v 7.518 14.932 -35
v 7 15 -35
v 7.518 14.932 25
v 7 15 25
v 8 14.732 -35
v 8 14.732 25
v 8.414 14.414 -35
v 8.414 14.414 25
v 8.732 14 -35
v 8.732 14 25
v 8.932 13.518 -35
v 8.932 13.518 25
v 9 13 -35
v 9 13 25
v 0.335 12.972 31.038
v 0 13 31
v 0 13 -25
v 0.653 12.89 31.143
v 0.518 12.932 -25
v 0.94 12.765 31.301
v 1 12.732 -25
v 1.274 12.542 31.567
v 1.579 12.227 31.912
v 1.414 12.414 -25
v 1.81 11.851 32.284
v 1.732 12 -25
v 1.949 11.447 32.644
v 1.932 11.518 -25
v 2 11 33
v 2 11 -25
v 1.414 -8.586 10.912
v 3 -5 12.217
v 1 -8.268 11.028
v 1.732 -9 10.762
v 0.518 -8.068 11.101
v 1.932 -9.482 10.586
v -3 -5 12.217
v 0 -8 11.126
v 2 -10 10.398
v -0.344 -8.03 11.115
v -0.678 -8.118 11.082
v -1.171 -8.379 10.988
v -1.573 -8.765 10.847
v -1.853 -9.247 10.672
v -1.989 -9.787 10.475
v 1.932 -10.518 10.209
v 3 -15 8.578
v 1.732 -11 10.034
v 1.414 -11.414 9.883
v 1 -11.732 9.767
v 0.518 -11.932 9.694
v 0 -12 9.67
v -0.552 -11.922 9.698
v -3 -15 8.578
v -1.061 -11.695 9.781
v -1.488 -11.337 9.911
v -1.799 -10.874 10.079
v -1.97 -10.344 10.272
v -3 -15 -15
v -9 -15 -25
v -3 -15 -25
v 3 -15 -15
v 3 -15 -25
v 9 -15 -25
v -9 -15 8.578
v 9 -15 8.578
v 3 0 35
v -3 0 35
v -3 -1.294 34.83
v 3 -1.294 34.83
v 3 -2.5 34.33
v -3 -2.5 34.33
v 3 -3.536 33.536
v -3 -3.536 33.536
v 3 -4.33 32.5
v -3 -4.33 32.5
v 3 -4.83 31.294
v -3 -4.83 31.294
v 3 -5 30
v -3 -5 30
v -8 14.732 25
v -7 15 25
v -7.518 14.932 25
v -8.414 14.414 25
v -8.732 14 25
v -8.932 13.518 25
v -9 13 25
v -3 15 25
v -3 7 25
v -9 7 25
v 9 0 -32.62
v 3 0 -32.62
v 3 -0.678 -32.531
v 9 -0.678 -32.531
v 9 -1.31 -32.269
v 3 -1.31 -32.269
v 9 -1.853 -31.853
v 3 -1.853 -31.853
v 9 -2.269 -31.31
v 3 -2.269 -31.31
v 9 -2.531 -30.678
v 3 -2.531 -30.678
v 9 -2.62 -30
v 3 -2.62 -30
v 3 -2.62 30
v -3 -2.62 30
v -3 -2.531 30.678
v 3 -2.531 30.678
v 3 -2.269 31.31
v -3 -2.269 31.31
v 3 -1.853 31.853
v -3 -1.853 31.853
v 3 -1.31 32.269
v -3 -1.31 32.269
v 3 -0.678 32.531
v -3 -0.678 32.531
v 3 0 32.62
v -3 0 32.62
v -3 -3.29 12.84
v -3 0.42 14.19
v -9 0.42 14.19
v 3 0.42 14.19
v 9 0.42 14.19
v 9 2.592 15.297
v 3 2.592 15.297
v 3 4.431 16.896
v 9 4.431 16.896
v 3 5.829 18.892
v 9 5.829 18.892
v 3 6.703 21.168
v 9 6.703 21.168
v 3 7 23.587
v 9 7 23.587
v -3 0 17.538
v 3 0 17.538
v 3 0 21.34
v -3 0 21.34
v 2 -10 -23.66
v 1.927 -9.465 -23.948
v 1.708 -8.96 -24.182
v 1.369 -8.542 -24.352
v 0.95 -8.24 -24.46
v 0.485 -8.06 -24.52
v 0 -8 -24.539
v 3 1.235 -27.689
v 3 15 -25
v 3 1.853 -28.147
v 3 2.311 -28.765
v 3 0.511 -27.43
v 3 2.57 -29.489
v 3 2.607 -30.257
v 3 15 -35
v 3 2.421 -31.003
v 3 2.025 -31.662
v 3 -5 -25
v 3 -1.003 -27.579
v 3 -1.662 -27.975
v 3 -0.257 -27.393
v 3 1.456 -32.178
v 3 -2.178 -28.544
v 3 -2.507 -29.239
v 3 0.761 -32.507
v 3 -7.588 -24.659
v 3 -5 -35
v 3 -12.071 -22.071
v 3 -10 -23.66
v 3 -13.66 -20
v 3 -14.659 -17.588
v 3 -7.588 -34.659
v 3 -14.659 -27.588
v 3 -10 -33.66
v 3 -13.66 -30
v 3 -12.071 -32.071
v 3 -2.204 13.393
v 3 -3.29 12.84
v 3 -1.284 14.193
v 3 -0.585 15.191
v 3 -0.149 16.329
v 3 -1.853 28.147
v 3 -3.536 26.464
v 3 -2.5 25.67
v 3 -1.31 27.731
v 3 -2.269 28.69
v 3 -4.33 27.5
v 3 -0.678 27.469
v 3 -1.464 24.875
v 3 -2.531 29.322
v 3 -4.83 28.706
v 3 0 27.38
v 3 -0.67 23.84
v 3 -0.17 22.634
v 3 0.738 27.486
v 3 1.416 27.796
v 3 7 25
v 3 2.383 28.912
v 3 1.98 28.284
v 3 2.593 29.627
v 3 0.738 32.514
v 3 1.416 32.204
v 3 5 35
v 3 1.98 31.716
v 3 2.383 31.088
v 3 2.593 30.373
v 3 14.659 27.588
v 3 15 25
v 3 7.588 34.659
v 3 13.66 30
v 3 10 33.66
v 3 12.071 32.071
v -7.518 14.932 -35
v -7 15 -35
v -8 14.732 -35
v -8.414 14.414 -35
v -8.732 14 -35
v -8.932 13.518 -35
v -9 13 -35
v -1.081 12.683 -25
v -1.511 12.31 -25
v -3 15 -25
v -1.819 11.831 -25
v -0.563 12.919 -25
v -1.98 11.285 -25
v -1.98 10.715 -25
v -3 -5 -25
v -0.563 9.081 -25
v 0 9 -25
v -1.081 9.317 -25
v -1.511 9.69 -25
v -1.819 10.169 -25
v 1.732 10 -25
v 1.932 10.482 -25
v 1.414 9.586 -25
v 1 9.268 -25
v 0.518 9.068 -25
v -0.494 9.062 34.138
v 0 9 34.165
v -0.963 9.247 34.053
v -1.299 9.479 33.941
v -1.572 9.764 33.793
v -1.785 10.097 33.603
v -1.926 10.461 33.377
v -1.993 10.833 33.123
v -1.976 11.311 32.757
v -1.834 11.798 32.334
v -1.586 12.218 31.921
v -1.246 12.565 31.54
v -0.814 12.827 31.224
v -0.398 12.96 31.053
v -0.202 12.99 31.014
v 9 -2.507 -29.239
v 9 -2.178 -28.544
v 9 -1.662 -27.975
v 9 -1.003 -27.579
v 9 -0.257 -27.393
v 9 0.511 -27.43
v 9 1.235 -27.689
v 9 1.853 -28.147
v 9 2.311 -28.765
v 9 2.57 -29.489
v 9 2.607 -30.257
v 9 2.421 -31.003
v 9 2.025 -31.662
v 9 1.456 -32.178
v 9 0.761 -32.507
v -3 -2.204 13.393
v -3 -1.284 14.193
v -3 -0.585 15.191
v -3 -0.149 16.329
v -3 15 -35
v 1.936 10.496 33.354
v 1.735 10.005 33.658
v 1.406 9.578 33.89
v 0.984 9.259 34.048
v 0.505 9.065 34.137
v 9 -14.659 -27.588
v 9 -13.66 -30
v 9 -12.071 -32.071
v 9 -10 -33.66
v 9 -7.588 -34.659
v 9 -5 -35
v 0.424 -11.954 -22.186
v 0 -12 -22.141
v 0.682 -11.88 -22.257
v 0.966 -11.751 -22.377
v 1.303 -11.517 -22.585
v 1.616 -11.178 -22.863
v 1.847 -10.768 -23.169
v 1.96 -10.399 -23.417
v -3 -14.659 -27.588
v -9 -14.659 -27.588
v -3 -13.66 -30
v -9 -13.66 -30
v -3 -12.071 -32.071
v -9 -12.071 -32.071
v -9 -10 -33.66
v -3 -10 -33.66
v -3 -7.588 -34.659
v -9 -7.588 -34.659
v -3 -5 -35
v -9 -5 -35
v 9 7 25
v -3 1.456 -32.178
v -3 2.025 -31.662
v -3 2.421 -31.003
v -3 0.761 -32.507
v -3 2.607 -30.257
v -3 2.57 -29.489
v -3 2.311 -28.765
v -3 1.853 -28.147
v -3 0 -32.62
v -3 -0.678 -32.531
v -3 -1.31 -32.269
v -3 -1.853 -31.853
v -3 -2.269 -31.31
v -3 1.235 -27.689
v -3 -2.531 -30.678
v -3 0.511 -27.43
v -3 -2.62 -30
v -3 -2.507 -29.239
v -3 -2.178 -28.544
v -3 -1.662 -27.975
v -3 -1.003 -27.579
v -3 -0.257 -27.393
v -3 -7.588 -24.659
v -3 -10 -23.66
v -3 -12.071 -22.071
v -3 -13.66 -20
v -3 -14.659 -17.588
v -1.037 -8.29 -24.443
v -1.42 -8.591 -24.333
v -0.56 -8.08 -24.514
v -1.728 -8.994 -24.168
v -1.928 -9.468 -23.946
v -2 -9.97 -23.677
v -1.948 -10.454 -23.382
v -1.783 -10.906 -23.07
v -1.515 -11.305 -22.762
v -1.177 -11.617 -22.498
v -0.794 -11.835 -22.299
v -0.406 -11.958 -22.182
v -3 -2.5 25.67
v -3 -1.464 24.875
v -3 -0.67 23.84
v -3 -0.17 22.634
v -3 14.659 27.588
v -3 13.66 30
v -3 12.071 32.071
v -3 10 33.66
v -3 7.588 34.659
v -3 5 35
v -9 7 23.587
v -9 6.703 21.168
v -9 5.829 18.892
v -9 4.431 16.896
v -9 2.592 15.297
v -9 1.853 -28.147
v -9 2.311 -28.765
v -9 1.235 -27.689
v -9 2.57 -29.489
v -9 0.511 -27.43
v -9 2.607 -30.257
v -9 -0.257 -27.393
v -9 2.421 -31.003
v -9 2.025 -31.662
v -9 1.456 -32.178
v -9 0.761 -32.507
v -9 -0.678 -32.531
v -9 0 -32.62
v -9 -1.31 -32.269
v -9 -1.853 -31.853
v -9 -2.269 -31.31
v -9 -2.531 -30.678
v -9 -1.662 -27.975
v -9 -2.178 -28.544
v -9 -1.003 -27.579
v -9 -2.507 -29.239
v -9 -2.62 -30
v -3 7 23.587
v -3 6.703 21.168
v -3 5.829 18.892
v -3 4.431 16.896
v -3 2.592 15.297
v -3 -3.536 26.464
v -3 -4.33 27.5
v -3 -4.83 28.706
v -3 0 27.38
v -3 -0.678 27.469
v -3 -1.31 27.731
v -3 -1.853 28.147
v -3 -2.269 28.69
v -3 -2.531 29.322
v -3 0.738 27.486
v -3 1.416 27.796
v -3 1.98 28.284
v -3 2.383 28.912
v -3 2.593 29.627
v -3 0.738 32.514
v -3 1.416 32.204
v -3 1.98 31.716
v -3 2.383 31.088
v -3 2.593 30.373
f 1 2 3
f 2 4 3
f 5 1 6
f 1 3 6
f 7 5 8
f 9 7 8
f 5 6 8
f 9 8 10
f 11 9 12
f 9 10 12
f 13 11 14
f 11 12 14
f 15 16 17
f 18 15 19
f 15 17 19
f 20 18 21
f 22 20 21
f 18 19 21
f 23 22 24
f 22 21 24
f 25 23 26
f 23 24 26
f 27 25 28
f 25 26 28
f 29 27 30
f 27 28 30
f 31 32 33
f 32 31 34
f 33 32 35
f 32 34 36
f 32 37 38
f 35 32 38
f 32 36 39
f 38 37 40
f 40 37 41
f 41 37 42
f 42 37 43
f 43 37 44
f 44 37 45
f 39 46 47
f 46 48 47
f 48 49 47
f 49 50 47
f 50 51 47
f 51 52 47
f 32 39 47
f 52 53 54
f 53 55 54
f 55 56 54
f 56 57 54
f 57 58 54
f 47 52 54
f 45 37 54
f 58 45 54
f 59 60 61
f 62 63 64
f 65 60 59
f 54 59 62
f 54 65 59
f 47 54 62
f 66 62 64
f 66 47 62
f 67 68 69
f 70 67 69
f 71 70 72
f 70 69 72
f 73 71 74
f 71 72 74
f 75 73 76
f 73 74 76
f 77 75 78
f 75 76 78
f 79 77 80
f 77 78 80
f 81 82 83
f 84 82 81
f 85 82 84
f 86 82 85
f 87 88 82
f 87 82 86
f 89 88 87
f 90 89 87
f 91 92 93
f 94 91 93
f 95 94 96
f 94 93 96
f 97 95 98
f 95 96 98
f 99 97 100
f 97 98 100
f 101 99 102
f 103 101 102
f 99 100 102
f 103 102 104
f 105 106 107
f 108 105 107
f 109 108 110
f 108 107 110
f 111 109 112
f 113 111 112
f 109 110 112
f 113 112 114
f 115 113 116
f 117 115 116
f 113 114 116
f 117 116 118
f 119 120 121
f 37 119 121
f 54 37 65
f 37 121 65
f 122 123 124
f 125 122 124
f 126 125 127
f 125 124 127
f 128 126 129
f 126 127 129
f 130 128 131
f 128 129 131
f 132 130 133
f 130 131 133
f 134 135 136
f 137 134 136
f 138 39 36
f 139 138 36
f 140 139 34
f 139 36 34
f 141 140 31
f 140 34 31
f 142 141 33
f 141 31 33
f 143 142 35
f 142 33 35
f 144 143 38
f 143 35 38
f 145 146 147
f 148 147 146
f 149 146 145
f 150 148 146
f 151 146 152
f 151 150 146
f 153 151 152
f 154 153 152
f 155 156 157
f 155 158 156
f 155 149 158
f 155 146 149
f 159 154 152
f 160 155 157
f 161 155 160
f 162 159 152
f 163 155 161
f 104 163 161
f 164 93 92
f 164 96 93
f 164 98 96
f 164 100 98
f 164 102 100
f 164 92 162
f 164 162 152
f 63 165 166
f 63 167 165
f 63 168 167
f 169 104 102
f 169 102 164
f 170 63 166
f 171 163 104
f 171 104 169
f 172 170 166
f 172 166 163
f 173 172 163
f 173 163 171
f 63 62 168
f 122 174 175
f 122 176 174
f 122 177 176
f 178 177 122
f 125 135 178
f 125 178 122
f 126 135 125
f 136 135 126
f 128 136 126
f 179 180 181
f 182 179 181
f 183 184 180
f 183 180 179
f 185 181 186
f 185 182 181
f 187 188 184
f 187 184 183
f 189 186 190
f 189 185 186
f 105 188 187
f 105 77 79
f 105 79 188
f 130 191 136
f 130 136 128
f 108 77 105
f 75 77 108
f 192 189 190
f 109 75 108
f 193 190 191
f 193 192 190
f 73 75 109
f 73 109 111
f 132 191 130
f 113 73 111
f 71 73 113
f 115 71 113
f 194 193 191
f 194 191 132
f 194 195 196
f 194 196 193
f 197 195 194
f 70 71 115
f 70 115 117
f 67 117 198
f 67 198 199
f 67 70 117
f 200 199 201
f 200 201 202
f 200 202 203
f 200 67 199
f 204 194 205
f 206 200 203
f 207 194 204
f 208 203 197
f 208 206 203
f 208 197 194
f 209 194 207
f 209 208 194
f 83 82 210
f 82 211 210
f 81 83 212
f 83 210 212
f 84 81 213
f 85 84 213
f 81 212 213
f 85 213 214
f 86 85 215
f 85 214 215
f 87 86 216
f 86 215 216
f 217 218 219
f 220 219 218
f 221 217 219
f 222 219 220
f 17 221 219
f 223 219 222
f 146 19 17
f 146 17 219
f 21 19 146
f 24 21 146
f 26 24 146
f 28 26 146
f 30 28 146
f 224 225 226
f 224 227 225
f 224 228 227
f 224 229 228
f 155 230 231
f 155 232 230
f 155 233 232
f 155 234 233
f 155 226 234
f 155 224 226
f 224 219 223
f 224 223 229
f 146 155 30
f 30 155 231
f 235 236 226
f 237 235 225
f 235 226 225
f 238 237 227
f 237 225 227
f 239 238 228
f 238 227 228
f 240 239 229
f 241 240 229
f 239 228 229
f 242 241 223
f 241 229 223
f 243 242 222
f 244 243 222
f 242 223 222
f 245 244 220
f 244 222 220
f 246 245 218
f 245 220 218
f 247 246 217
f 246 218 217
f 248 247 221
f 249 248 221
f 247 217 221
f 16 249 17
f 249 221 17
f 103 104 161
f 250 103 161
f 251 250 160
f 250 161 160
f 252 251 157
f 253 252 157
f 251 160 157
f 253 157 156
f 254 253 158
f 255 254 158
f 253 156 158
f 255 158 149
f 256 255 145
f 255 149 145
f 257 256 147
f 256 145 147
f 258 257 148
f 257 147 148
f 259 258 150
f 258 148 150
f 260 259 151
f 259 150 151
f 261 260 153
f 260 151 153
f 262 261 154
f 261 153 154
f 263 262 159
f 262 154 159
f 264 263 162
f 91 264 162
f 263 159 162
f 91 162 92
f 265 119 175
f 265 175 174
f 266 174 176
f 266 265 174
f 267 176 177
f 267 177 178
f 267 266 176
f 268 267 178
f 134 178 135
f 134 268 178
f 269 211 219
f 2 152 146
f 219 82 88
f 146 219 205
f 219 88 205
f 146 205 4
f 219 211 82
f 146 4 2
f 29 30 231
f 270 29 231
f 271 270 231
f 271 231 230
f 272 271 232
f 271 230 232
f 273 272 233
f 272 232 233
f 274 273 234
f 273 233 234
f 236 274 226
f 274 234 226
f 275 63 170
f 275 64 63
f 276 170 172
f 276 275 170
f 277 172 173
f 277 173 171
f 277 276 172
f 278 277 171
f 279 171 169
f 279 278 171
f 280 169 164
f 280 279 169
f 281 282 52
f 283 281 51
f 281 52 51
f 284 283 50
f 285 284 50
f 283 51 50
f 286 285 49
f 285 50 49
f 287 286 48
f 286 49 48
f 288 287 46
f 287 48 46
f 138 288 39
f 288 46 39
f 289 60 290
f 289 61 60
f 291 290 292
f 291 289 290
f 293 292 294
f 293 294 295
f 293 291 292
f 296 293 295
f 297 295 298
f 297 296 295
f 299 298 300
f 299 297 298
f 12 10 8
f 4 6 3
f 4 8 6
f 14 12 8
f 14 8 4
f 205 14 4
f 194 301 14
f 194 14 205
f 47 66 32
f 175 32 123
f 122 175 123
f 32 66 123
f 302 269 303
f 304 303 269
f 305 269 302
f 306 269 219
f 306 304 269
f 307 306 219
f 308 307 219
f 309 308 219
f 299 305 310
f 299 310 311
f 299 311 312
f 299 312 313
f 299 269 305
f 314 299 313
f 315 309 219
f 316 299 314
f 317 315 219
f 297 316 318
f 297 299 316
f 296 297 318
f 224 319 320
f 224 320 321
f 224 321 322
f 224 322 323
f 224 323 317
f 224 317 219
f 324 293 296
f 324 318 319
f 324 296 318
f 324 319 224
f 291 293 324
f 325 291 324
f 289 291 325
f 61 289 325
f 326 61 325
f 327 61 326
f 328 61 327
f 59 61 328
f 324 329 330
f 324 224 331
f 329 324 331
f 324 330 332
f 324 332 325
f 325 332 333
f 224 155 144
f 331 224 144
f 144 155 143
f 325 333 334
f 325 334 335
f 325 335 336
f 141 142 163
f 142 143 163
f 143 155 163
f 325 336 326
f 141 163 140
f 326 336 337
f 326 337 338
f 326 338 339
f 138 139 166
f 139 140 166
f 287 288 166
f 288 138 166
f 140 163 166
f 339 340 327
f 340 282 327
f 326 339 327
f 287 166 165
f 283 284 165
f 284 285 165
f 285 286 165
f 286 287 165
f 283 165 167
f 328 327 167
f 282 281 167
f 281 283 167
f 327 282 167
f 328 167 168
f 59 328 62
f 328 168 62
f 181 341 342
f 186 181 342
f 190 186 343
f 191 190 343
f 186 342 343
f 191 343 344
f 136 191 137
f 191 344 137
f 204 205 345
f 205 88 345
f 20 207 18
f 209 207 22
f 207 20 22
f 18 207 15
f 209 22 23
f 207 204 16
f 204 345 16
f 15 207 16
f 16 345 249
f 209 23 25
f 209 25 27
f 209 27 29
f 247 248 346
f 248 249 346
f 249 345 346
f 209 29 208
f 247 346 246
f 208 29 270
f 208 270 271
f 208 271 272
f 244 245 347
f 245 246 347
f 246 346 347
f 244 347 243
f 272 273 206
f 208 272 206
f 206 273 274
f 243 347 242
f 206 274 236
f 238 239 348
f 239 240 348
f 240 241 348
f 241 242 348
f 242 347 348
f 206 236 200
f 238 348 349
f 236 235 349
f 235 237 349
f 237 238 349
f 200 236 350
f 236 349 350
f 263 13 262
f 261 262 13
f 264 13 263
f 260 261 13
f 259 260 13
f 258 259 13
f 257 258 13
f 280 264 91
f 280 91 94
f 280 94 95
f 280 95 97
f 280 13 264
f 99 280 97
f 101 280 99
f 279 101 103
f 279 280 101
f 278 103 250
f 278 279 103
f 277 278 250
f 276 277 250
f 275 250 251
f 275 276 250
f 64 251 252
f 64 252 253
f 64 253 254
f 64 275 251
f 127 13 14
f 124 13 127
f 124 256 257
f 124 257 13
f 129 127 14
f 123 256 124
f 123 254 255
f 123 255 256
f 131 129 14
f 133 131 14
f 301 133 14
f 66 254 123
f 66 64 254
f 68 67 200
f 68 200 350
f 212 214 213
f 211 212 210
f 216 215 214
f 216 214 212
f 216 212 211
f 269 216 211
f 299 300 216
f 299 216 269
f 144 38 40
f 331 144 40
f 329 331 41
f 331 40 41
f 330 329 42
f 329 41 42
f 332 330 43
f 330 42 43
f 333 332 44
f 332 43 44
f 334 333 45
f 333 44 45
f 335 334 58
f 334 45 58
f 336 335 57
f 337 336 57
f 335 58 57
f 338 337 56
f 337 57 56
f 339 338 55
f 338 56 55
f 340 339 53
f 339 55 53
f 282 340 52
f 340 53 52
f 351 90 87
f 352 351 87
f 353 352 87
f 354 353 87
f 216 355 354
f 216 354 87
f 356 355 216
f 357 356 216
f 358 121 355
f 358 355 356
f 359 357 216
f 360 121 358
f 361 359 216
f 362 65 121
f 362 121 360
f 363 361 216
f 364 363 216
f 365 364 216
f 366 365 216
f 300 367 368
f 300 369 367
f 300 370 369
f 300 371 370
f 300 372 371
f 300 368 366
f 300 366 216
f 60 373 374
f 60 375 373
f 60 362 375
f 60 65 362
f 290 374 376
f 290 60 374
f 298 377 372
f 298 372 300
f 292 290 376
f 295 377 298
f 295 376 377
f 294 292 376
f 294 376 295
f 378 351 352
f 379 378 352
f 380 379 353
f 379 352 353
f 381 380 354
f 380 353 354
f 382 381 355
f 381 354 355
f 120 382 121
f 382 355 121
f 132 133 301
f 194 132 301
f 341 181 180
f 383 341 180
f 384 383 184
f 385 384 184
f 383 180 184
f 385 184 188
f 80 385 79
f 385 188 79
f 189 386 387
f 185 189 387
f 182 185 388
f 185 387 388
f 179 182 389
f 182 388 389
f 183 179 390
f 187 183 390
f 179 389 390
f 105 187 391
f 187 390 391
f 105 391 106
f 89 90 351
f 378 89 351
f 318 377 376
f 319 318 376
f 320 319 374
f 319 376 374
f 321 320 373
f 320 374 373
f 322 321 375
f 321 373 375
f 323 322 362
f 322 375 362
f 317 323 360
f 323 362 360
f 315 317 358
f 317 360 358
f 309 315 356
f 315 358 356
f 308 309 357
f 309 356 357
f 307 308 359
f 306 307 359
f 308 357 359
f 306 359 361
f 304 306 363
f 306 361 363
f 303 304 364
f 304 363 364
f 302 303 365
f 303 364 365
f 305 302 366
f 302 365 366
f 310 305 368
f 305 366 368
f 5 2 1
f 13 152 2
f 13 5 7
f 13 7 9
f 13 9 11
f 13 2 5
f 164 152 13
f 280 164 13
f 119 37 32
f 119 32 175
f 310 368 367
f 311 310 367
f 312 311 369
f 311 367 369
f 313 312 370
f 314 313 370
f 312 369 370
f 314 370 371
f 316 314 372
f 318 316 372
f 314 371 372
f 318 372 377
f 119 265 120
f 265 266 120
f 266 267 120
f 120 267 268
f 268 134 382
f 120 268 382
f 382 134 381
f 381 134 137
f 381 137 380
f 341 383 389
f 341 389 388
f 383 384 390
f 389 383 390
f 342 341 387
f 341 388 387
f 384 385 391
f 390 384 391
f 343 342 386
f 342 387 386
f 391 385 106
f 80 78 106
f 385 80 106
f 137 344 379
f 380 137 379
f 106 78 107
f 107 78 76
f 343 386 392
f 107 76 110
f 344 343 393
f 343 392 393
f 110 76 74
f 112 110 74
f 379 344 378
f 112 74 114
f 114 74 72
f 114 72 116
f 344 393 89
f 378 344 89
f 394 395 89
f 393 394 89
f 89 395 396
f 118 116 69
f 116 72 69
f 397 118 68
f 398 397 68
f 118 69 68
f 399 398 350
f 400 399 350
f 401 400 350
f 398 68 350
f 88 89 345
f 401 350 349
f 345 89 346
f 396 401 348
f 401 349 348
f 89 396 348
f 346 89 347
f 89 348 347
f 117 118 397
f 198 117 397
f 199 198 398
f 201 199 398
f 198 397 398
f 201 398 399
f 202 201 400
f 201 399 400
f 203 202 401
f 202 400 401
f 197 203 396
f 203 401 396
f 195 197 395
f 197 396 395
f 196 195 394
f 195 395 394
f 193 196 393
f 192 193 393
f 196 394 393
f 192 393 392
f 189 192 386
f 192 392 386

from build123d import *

# Parameters (mm, degrees)
F1_DEPTH     = 15
F3_DEPTH     = 6
F5_DEPTH     = 18
F6_R         = 10
F9_DEPTH     = 6
F10_DEPTH    = 6
F11_R        = 2
F13_DEPTH    = 6
F15_R        = 10
F19_DEPTH    = 65.001
F21_DEPTH    = 60.001
F23_DEPTH    = 6
F24_T1_DEPTH = 6


# Not quite as in the source:
# - a fillet or chamfer that OpenCascade refuses, or shapes differently, is made with other operations: its cross-section is extruded or revolved along the edge and cut away or added


with BuildPart() as f1:
    # F0 (on Front) → F1 (new body, symmetric)
    with BuildSketch(Plane.XZ):
        Polygon((9, -25), (9, 25), (3, 25), (3, 35), (-3, 35), (-3, 25), (-9, 25), (-9, -25), (-9, -35), (-3, -35), (-3, -25), (3, -25), (3, -35), (9, -35), align=None)
    extrude(amount=F1_DEPTH, both=True)

    # F2 (on face) → F3 (cut)
    with BuildSketch(Plane(origin=(-3, 0, 0), x_dir=(0, -1, 0), z_dir=(-1, 0, 0))):
        with BuildLine():
            ThreePointArc((0, 32.62), (-2.62, 30), (0, 27.38))
            Line((0, 27.38), (0, 32.62))
        make_face()
        with BuildLine():
            Line((0, 32.62), (0, 27.38))
            ThreePointArc((0, 27.38), (1.8526197667, 28.1473802333), (2.62, 30))
            ThreePointArc((2.62, 30), (1.8526197667, 31.8526197667), (0, 32.62))
        make_face()
    extrude(amount=-F3_DEPTH, mode=Mode.SUBTRACT)

    # F4 (on face) → F5 (cut)
    with BuildSketch(Plane(origin=(-9, 0, 0), x_dir=(0, -1, 0), z_dir=(-1, 0, 0))):
        with BuildLine():
            ThreePointArc((0, -32.62), (1.8526197667, -31.8526197667), (2.62, -30))
            ThreePointArc((2.62, -30), (-1.8526197667, -28.1473802333), (0, -32.62))
        make_face()
    extrude(amount=-F5_DEPTH, mode=Mode.SUBTRACT)

    # F6
    f6_edges = [f1.edges().sort_by_distance(p)[0] for p in [
        (0, 15, 35),
        (0, -15, 35),
        (6, -15, -35),
        (-6, -15, -35),
    ]]
    fillet(f6_edges, radius=F6_R)

    # F8 (on face) → F9 (cut)
    with BuildSketch(Plane(origin=(-9, 0, 0), x_dir=(0, -1, 0), z_dir=(-1, 0, 0))):
        with BuildLine():
            ThreePointArc((-7, 23.5872004348), (-5.1915204429, 17.8514360713), (-0.4202014333, 14.190274227))
            Line((-0.4202014333, 14.190274227), (15, 8.5777798989))
            Line((15, 8.5777798989), (15, 25))
            Line((15, 25), (-7, 25))
            Line((-7, 25), (-7, 23.5872004348))
        make_face()
    extrude(amount=-F9_DEPTH, mode=Mode.SUBTRACT)

    # F7 (on face) → F10 (cut)
    with BuildSketch(Plane.YZ.offset(9)):
        with BuildLine():
            Line((7, 25), (-15, 25))
            Line((-15, 25), (-15, 8.57778))
            Line((-15, 8.57778), (0.4202014333, 14.1902743281))
            ThreePointArc((0.4202014333, 14.1902743281), (5.1915204429, 17.8514361724), (7, 23.587200536))
            Line((7, 23.587200536), (7, 25))
        make_face()
    extrude(amount=-F10_DEPTH, mode=Mode.SUBTRACT)

    # F11
    f11_edges = [f1.edges().sort_by_distance(p)[0] for p in [
        (9, 15, -5),
        (-9, 15, -5),
    ]]
    fillet(f11_edges, radius=F11_R)

    # F12 (on face) → F13 (cut)
    with BuildSketch(Plane(origin=(-3, 0, 0), x_dir=(0, -1, 0), z_dir=(-1, 0, 0))):
        with BuildLine():
            Line((5, 35), (0, 35))
            ThreePointArc((0, 35), (3.5355339059, 33.5355339059), (5, 30))
            Line((5, 30), (5, 12.2174822415))
            Line((5, 12.2174822415), (15, 8.5777798989))
            Line((15, 8.5777798989), (15, 25))
            ThreePointArc((15, 25), (12.0710678119, 32.0710678119), (5, 35))
        make_face()
    extrude(amount=-F13_DEPTH, mode=Mode.SUBTRACT)

    # F15
    f15_edges = [f1.edges().sort_by_distance(p)[0] for p in [
        (0, -15, -25),
    ]]
    fillet(f15_edges, radius=F15_R)

    # F18 (on face) → F19 (cut, through all)
    with BuildSketch(Plane.XY.offset(30)):
        with BuildLine():
            ThreePointArc((2, -10), (1.4142135624, -8.5857864376), (0, -8))
            Line((0, -8), (0, -12))
            ThreePointArc((0, -12), (1.4142135624, -11.4142135624), (2, -10))
        make_face()
        with BuildLine():
            Line((0, -12), (0, -8))
            ThreePointArc((0, -8), (-2, -10), (0, -12))
        make_face()
    extrude(amount=-F19_DEPTH, mode=Mode.SUBTRACT)

    # F20 (on face) → F21 (cut, through all)
    with BuildSketch(Plane(origin=(0, 0, -25), x_dir=(1, 0, 0), z_dir=(0, 0, -1))):
        with BuildLine():
            ThreePointArc((0, -9), (-2, -11), (0, -13))
            Line((0, -13), (0, -11))
            Line((0, -11), (0, -9))
        make_face()
        with BuildLine():
            Line((0, -11), (0, -13))
            ThreePointArc((0, -13), (1.4142135624, -12.4142135624), (2, -11))
            ThreePointArc((2, -11), (1.4142135624, -9.5857864376), (0, -9))
            Line((0, -9), (0, -11))
        make_face()
    extrude(amount=-F21_DEPTH, mode=Mode.SUBTRACT)

    # F22 (on face) → F23 (cut)
    with BuildSketch(Plane.YZ.offset(3)):
        with BuildLine():
            ThreePointArc((0, 25), (-3.5355339059, 26.4644660941), (-5, 30))
            Line((-5, 30), (-5, 12.2174822415))
            Line((-5.0000000325, 12.2174823308), (0, 14.037333514))
            Line((0, 14.037333514), (0, 25))
        make_face()
    extrude(amount=-F23_DEPTH, mode=Mode.SUBTRACT)

    # F24: fillet of radius 5 on 2 edges, made by hand

    # F24_s2 → F24_t1 (join)
    with BuildSketch(Plane.YZ.offset(-3)):
        with BuildLine():
            ThreePointArc((-2.5, 25.6698729811), (-0.6698729811, 23.8397459622), (0, 21.3397459622))
            Line((0, 21.3397459622), (0, 25))
            ThreePointArc((0, 25), (-1.2940952255, 25.1703708686), (-2.5, 25.6698729811))
        make_face()
        with BuildLine():
            ThreePointArc((-3.2898992834, 12.8399081011), (-0.9042397786, 14.6704890233), (0, 17.538371205))
            Line((0, 17.538371205), (0, 14.037333514))
            Line((0, 14.037333514), (-3.2898992834, 12.8399081011))
        make_face()
    extrude(amount=F24_T1_DEPTH)


solid = f1.part
